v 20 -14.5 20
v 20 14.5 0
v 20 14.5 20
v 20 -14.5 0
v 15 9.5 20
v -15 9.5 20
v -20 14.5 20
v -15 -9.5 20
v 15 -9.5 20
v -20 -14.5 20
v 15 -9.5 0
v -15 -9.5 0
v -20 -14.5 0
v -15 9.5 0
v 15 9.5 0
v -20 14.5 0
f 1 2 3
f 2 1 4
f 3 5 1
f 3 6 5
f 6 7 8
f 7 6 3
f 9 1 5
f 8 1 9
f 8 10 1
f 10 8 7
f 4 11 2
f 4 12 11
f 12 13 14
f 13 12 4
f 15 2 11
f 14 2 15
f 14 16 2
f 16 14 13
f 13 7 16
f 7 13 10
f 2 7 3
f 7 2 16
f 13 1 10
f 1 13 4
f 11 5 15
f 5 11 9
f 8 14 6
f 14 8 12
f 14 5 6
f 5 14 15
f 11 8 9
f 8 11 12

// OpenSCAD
module iec_inlet() {
    difference() {
        // Main body
        union() {
            // Main rectangular body
            translate([-20, -14.5, 0])
                cube([40, 29, 20]);
            // Cylindrical filter part
            translate([0, 0, 10])
                cylinder(h=10, r=10, $fn=64);
        }
        // Cutout for the inlet
        translate([-15, -9.5, 0])
            cube([30, 19, 20]);
    }
}

iec_inlet();
